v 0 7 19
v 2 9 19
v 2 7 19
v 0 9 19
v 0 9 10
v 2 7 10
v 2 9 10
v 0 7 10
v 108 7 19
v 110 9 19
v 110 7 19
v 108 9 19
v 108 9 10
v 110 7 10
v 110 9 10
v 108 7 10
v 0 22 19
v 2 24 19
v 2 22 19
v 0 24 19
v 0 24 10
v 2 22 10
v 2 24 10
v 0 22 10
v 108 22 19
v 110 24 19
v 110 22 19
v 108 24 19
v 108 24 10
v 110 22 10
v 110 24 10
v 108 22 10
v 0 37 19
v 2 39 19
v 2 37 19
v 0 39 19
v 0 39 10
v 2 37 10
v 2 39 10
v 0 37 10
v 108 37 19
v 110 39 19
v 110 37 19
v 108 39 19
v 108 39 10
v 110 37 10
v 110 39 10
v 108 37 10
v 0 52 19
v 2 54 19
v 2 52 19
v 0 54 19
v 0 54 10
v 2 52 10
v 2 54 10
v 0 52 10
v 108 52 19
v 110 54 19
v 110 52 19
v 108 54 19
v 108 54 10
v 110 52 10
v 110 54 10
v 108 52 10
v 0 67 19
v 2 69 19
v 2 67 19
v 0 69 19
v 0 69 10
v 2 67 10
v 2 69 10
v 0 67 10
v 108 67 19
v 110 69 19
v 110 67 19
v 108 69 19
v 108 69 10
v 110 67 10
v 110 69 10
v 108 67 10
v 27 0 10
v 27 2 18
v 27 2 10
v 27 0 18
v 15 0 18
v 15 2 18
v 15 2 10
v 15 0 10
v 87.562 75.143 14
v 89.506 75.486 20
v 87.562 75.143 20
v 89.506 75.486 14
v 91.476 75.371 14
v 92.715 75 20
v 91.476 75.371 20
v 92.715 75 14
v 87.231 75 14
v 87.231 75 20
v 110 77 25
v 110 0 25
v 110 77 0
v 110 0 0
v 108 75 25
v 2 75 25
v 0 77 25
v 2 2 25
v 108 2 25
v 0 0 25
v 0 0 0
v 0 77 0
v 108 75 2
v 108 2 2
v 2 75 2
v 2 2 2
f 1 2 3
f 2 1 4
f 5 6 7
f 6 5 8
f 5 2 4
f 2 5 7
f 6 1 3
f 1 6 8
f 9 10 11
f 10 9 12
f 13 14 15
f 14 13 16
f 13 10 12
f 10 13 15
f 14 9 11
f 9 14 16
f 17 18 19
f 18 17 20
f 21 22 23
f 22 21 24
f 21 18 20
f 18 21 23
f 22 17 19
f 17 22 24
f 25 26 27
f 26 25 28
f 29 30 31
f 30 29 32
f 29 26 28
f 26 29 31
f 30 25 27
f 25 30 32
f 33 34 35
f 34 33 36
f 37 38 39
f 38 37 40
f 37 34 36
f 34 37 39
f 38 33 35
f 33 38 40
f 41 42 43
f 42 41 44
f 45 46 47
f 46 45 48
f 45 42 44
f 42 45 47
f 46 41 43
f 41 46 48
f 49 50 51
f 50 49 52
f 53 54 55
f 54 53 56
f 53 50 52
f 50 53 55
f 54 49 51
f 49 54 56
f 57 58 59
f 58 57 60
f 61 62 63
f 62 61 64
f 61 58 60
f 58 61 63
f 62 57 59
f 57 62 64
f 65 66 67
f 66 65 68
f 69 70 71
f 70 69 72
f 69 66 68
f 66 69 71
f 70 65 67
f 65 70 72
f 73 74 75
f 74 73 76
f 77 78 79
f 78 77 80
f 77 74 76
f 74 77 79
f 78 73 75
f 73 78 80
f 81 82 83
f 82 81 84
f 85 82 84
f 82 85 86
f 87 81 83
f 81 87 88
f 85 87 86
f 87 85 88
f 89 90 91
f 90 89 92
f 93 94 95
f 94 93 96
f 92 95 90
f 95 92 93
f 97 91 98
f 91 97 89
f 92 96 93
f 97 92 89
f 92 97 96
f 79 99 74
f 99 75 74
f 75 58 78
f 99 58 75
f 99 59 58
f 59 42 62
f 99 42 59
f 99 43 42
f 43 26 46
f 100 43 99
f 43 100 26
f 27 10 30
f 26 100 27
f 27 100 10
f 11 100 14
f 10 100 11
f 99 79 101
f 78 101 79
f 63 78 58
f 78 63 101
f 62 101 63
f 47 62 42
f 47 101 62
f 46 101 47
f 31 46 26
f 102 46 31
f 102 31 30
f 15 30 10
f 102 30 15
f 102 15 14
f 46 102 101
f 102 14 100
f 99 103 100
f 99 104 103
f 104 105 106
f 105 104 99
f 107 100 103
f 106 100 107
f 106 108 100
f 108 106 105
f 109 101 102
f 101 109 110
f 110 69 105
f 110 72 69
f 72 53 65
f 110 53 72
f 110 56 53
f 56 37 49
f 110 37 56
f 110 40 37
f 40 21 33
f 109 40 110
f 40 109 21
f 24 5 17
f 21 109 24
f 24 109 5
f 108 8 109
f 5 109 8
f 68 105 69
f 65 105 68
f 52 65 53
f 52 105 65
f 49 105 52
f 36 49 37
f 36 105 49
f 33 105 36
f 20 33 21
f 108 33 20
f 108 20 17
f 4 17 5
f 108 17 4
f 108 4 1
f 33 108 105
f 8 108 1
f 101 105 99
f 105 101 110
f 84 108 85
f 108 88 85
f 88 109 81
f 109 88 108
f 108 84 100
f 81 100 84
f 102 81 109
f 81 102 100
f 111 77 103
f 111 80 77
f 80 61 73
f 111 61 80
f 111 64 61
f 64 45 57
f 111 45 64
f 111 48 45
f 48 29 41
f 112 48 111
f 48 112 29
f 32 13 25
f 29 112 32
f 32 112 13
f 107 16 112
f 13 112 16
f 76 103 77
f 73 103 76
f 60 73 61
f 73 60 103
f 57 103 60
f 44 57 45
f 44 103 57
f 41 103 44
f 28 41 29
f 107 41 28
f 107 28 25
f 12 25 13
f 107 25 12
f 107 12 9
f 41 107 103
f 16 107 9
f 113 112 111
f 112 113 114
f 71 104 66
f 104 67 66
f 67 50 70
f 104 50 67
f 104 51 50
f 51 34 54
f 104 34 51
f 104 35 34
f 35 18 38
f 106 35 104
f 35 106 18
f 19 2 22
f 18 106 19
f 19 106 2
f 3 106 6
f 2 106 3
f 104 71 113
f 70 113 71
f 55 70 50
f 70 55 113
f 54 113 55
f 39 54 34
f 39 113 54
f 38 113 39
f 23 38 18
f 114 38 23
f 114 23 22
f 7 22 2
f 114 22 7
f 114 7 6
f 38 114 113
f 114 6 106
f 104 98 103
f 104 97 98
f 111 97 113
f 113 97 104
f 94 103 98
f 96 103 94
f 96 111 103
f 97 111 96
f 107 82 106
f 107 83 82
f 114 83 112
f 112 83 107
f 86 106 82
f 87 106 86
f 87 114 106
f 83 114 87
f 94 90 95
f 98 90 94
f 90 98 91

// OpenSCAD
// Dimensions (adjusted for your components)
stm32_length = 100;   // PCB length
stm32_width = 67;     // PCB width
stm32_height = 15;    // Include pins (3mm PCB + 12mm pins)
wall_thickness = 2;    // Enclosure wall thickness
lid_height = 5;        // Lid thickness

// Main box outer dimensions
box_length = stm32_length + 10;  // Extra space
box_width = stm32_width + 10;    
box_height = stm32_height + lid_height + 5;  // Sensor clearance

// MQ7 sensor cutout
mq7_diameter = 17;  
mq7_height = 10;     

// Main box (hollow)
module box() {
    difference() {
        // Outer cube
        cube([box_length, box_width, box_height]);
        
        // Inner hollow (walls)
        translate([wall_thickness, wall_thickness, wall_thickness]) {
            cube([
                box_length - 2*wall_thickness,
                box_width - 2*wall_thickness,
                box_height + 1
            ]);
        }
        
        // Component holes
        holes();
    }
}

// Lid (snap-fit)
module lid() {
    difference() {
        cube([box_length, box_width, lid_height]);
        // Lip for fitting
        translate([wall_thickness, wall_thickness, -1]) {
            cube([
                box_length - 2*wall_thickness,
                box_width - 2*wall_thickness,
                lid_height + 2
            ]);
        }
    }
}

// Holes for components
module holes() {
    // LoRa antenna hole (side)
    translate([box_length - 5, box_width/2, box_height - 10]) {
        rotate([90, 0, 0]) {
            cylinder(h=wall_thickness + 2, d=6, center=true);
        }
    }
    
    // USB port hole (front)
    translate([15, -1, 10]) {
        cube([12, wall_thickness + 2, 8]);
    }
    
    // MQ7 sensor hole (top, circular)
    translate([box_length - 20, box_width - 10, box_height - mq7_height - 1]) {
        cylinder(h=mq7_height + 2, d=mq7_diameter);
    }
    
    // Slotted side vents (elongated)
    for (i = [0:4]) {
        // Left side
        translate([-1, 7 + i*15, box_height - 15]) {
            cube([wall_thickness + 2, 2, 9]);  // 10mm long, 3mm tall
        }
        // Right side
        translate([box_length - wall_thickness - 1, 7 + i*15, box_height - 15]) {
            cube([wall_thickness + 2, 2, 9]);
        }
    }
}

// Render box + lid (closed)
difference() {
    union() {
        box();
        translate([0, 0, box_height - lid_height]) lid();  // Lid in place
    }
    // Uncomment to debug cuts:
    // #holes();
}
